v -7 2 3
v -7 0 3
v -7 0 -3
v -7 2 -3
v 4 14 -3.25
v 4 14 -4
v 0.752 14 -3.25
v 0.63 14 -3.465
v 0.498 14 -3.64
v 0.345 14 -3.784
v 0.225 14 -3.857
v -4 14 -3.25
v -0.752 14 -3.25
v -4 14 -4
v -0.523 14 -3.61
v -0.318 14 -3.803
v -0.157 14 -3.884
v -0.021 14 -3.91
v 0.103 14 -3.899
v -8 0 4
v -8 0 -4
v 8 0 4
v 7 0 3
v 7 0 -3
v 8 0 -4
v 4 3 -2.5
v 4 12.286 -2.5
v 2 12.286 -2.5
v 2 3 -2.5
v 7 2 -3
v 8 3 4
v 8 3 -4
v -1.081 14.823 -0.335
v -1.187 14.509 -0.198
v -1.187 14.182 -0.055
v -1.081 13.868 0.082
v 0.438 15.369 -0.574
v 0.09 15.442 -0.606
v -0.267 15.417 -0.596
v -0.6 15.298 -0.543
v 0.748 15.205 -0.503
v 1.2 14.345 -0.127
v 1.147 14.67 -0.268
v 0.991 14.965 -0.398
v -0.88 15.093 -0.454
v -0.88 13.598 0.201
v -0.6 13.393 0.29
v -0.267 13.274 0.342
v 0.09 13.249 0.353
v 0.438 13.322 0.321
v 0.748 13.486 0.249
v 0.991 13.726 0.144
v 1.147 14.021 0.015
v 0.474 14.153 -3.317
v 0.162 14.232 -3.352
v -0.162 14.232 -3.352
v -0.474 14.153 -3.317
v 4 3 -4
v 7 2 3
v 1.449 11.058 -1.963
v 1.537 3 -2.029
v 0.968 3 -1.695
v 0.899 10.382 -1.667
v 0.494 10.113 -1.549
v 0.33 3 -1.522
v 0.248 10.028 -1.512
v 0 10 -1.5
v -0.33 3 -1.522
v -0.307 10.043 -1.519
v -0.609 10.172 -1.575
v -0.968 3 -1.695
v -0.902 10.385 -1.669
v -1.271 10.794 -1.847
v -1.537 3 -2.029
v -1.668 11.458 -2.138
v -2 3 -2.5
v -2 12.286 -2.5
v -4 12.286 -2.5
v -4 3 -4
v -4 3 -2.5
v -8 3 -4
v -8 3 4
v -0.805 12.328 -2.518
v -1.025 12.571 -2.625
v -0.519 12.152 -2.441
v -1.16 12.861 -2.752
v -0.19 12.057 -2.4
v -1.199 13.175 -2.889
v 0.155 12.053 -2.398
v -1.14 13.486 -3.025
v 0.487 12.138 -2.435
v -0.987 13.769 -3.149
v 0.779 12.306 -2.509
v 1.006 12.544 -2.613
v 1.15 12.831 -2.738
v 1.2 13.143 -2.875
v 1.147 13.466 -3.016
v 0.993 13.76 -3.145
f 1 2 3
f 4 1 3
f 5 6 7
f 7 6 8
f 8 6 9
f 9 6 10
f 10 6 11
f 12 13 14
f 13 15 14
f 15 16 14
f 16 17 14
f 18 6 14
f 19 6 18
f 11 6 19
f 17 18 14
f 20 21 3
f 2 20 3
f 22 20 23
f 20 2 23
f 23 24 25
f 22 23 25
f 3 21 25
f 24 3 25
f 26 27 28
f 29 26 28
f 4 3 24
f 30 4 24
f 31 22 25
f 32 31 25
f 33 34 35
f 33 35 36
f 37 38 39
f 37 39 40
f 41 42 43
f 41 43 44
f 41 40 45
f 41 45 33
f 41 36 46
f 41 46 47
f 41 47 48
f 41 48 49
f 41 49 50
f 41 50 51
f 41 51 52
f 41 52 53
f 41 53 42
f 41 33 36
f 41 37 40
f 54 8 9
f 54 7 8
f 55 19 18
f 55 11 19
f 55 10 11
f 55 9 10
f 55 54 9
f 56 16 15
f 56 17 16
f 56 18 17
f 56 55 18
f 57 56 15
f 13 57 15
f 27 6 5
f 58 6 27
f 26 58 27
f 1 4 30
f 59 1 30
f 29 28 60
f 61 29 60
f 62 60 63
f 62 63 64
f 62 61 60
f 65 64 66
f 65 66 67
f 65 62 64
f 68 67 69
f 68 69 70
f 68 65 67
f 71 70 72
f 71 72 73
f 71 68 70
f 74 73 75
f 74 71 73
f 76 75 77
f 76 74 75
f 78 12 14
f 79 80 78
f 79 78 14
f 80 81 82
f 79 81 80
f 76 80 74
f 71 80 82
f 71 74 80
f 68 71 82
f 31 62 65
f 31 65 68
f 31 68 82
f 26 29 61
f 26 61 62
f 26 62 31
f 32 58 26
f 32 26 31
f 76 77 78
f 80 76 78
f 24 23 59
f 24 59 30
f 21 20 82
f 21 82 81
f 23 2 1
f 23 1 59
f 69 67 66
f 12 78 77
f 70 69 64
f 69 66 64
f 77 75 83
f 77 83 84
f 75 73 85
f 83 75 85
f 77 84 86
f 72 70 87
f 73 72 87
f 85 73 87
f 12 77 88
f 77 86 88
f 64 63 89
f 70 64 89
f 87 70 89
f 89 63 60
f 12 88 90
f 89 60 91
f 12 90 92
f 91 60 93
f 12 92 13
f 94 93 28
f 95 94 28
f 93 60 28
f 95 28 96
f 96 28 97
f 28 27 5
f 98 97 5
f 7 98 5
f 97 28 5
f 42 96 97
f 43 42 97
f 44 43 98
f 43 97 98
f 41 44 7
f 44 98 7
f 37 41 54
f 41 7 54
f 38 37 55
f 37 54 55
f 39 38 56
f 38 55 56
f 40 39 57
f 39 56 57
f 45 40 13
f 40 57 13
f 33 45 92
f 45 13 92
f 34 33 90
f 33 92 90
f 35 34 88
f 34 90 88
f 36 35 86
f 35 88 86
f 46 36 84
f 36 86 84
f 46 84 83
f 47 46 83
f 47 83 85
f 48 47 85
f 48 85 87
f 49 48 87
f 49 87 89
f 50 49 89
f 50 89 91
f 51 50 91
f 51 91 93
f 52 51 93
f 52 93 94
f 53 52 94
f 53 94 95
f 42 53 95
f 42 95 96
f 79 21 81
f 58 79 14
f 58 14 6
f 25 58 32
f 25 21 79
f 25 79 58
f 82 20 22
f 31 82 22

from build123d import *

# Parameters (mm, degrees)
SKETCH1_W                       = 16
SKETCH1_H                       = 8
BOSS_EXTRUDE1_DEPTH             = 3
SHELL1_T                        = -1
BOSS_EXTRUDE2_DEPTH             = 11
CUT_EXTRUDE1_DEPTH              = 13
SKETCH4_R                       = 1.2
BOSS_EXTRUDE3_DEPTH             = 3
BOSS_EXTRUDE3_DIRECTION_2_REACH = 8.299


with BuildPart() as part:
    # Sketch1 → Boss-Extrude1 (new body)
    with BuildSketch(Plane(origin=(0, 0, 0), x_dir=(1, 0, 0), z_dir=(0, 1, 0))):
        Rectangle(SKETCH1_W, SKETCH1_H)
    extrude(amount=BOSS_EXTRUDE1_DEPTH)

    # Shell1
    shell1_openings = [part.faces().sort_by_distance(p)[0] for p in [
        (0, 0, 0),
    ]]
    offset(amount=SHELL1_T, openings=shell1_openings, kind=Kind.INTERSECTION)

    # Sketch2 → Boss-Extrude2 (add)
    with BuildSketch(Plane(origin=(0, 3, 0), x_dir=(1, 0, 0), z_dir=(0, 1, 0))):
        with BuildLine():
            Line((-4, 4), (4, 4))
            Line((4, 4), (4, 2.5))
            Line((4, 2.5), (2, 2.5))
            ThreePointArc((2, 2.5), (0, 1.5), (-2, 2.5))
            Line((-2, 2.5), (-4, 2.5))
            Line((-4, 2.5), (-4, 4))
        make_face()
    extrude(amount=BOSS_EXTRUDE2_DEPTH)

    # Sketch3 → Cut-Extrude1 (cut, through all)
    with BuildSketch(Plane(origin=(4, 0, 0), x_dir=(0, 0, -1), z_dir=(1, 0, 0))):
        Polygon((1.5, 14), (1.5, 10), (3.25, 14), align=None)
    extrude(amount=-CUT_EXTRUDE1_DEPTH, mode=Mode.SUBTRACT)

    # Sketch4 → Boss-Extrude3 (add)
    with BuildSketch(Plane(origin=(0, 1.055737705, 2.413114754), x_dir=(1, 0, 0), z_dir=(0, 0.400818834, 0.916157335))):
        with Locations((0, 13.193478025)):
            Circle(SKETCH4_R)
    extrude(amount=BOSS_EXTRUDE3_DEPTH)

    # Sketch4 → Boss-Extrude3 direction 2 (add, up to next)
    with BuildSketch(Plane(origin=(0, 1.055737705, 2.413114754), x_dir=(1, 0, 0), z_dir=(0, 0.400818834, 0.916157335)), mode=Mode.PRIVATE) as boss_extrude3_direction_2_sk1:
        with Locations((0, 13.193478025)):
            Circle(SKETCH4_R)
    boss_extrude3_direction_2_tool1 = extrude(boss_extrude3_direction_2_sk1.sketch, amount=-BOSS_EXTRUDE3_DIRECTION_2_REACH, mode=Mode.PRIVATE) - part.part
    add(boss_extrude3_direction_2_tool1.solids().sort_by_distance((0, 13.143039, -2.87508))[0])


solid = part.part
